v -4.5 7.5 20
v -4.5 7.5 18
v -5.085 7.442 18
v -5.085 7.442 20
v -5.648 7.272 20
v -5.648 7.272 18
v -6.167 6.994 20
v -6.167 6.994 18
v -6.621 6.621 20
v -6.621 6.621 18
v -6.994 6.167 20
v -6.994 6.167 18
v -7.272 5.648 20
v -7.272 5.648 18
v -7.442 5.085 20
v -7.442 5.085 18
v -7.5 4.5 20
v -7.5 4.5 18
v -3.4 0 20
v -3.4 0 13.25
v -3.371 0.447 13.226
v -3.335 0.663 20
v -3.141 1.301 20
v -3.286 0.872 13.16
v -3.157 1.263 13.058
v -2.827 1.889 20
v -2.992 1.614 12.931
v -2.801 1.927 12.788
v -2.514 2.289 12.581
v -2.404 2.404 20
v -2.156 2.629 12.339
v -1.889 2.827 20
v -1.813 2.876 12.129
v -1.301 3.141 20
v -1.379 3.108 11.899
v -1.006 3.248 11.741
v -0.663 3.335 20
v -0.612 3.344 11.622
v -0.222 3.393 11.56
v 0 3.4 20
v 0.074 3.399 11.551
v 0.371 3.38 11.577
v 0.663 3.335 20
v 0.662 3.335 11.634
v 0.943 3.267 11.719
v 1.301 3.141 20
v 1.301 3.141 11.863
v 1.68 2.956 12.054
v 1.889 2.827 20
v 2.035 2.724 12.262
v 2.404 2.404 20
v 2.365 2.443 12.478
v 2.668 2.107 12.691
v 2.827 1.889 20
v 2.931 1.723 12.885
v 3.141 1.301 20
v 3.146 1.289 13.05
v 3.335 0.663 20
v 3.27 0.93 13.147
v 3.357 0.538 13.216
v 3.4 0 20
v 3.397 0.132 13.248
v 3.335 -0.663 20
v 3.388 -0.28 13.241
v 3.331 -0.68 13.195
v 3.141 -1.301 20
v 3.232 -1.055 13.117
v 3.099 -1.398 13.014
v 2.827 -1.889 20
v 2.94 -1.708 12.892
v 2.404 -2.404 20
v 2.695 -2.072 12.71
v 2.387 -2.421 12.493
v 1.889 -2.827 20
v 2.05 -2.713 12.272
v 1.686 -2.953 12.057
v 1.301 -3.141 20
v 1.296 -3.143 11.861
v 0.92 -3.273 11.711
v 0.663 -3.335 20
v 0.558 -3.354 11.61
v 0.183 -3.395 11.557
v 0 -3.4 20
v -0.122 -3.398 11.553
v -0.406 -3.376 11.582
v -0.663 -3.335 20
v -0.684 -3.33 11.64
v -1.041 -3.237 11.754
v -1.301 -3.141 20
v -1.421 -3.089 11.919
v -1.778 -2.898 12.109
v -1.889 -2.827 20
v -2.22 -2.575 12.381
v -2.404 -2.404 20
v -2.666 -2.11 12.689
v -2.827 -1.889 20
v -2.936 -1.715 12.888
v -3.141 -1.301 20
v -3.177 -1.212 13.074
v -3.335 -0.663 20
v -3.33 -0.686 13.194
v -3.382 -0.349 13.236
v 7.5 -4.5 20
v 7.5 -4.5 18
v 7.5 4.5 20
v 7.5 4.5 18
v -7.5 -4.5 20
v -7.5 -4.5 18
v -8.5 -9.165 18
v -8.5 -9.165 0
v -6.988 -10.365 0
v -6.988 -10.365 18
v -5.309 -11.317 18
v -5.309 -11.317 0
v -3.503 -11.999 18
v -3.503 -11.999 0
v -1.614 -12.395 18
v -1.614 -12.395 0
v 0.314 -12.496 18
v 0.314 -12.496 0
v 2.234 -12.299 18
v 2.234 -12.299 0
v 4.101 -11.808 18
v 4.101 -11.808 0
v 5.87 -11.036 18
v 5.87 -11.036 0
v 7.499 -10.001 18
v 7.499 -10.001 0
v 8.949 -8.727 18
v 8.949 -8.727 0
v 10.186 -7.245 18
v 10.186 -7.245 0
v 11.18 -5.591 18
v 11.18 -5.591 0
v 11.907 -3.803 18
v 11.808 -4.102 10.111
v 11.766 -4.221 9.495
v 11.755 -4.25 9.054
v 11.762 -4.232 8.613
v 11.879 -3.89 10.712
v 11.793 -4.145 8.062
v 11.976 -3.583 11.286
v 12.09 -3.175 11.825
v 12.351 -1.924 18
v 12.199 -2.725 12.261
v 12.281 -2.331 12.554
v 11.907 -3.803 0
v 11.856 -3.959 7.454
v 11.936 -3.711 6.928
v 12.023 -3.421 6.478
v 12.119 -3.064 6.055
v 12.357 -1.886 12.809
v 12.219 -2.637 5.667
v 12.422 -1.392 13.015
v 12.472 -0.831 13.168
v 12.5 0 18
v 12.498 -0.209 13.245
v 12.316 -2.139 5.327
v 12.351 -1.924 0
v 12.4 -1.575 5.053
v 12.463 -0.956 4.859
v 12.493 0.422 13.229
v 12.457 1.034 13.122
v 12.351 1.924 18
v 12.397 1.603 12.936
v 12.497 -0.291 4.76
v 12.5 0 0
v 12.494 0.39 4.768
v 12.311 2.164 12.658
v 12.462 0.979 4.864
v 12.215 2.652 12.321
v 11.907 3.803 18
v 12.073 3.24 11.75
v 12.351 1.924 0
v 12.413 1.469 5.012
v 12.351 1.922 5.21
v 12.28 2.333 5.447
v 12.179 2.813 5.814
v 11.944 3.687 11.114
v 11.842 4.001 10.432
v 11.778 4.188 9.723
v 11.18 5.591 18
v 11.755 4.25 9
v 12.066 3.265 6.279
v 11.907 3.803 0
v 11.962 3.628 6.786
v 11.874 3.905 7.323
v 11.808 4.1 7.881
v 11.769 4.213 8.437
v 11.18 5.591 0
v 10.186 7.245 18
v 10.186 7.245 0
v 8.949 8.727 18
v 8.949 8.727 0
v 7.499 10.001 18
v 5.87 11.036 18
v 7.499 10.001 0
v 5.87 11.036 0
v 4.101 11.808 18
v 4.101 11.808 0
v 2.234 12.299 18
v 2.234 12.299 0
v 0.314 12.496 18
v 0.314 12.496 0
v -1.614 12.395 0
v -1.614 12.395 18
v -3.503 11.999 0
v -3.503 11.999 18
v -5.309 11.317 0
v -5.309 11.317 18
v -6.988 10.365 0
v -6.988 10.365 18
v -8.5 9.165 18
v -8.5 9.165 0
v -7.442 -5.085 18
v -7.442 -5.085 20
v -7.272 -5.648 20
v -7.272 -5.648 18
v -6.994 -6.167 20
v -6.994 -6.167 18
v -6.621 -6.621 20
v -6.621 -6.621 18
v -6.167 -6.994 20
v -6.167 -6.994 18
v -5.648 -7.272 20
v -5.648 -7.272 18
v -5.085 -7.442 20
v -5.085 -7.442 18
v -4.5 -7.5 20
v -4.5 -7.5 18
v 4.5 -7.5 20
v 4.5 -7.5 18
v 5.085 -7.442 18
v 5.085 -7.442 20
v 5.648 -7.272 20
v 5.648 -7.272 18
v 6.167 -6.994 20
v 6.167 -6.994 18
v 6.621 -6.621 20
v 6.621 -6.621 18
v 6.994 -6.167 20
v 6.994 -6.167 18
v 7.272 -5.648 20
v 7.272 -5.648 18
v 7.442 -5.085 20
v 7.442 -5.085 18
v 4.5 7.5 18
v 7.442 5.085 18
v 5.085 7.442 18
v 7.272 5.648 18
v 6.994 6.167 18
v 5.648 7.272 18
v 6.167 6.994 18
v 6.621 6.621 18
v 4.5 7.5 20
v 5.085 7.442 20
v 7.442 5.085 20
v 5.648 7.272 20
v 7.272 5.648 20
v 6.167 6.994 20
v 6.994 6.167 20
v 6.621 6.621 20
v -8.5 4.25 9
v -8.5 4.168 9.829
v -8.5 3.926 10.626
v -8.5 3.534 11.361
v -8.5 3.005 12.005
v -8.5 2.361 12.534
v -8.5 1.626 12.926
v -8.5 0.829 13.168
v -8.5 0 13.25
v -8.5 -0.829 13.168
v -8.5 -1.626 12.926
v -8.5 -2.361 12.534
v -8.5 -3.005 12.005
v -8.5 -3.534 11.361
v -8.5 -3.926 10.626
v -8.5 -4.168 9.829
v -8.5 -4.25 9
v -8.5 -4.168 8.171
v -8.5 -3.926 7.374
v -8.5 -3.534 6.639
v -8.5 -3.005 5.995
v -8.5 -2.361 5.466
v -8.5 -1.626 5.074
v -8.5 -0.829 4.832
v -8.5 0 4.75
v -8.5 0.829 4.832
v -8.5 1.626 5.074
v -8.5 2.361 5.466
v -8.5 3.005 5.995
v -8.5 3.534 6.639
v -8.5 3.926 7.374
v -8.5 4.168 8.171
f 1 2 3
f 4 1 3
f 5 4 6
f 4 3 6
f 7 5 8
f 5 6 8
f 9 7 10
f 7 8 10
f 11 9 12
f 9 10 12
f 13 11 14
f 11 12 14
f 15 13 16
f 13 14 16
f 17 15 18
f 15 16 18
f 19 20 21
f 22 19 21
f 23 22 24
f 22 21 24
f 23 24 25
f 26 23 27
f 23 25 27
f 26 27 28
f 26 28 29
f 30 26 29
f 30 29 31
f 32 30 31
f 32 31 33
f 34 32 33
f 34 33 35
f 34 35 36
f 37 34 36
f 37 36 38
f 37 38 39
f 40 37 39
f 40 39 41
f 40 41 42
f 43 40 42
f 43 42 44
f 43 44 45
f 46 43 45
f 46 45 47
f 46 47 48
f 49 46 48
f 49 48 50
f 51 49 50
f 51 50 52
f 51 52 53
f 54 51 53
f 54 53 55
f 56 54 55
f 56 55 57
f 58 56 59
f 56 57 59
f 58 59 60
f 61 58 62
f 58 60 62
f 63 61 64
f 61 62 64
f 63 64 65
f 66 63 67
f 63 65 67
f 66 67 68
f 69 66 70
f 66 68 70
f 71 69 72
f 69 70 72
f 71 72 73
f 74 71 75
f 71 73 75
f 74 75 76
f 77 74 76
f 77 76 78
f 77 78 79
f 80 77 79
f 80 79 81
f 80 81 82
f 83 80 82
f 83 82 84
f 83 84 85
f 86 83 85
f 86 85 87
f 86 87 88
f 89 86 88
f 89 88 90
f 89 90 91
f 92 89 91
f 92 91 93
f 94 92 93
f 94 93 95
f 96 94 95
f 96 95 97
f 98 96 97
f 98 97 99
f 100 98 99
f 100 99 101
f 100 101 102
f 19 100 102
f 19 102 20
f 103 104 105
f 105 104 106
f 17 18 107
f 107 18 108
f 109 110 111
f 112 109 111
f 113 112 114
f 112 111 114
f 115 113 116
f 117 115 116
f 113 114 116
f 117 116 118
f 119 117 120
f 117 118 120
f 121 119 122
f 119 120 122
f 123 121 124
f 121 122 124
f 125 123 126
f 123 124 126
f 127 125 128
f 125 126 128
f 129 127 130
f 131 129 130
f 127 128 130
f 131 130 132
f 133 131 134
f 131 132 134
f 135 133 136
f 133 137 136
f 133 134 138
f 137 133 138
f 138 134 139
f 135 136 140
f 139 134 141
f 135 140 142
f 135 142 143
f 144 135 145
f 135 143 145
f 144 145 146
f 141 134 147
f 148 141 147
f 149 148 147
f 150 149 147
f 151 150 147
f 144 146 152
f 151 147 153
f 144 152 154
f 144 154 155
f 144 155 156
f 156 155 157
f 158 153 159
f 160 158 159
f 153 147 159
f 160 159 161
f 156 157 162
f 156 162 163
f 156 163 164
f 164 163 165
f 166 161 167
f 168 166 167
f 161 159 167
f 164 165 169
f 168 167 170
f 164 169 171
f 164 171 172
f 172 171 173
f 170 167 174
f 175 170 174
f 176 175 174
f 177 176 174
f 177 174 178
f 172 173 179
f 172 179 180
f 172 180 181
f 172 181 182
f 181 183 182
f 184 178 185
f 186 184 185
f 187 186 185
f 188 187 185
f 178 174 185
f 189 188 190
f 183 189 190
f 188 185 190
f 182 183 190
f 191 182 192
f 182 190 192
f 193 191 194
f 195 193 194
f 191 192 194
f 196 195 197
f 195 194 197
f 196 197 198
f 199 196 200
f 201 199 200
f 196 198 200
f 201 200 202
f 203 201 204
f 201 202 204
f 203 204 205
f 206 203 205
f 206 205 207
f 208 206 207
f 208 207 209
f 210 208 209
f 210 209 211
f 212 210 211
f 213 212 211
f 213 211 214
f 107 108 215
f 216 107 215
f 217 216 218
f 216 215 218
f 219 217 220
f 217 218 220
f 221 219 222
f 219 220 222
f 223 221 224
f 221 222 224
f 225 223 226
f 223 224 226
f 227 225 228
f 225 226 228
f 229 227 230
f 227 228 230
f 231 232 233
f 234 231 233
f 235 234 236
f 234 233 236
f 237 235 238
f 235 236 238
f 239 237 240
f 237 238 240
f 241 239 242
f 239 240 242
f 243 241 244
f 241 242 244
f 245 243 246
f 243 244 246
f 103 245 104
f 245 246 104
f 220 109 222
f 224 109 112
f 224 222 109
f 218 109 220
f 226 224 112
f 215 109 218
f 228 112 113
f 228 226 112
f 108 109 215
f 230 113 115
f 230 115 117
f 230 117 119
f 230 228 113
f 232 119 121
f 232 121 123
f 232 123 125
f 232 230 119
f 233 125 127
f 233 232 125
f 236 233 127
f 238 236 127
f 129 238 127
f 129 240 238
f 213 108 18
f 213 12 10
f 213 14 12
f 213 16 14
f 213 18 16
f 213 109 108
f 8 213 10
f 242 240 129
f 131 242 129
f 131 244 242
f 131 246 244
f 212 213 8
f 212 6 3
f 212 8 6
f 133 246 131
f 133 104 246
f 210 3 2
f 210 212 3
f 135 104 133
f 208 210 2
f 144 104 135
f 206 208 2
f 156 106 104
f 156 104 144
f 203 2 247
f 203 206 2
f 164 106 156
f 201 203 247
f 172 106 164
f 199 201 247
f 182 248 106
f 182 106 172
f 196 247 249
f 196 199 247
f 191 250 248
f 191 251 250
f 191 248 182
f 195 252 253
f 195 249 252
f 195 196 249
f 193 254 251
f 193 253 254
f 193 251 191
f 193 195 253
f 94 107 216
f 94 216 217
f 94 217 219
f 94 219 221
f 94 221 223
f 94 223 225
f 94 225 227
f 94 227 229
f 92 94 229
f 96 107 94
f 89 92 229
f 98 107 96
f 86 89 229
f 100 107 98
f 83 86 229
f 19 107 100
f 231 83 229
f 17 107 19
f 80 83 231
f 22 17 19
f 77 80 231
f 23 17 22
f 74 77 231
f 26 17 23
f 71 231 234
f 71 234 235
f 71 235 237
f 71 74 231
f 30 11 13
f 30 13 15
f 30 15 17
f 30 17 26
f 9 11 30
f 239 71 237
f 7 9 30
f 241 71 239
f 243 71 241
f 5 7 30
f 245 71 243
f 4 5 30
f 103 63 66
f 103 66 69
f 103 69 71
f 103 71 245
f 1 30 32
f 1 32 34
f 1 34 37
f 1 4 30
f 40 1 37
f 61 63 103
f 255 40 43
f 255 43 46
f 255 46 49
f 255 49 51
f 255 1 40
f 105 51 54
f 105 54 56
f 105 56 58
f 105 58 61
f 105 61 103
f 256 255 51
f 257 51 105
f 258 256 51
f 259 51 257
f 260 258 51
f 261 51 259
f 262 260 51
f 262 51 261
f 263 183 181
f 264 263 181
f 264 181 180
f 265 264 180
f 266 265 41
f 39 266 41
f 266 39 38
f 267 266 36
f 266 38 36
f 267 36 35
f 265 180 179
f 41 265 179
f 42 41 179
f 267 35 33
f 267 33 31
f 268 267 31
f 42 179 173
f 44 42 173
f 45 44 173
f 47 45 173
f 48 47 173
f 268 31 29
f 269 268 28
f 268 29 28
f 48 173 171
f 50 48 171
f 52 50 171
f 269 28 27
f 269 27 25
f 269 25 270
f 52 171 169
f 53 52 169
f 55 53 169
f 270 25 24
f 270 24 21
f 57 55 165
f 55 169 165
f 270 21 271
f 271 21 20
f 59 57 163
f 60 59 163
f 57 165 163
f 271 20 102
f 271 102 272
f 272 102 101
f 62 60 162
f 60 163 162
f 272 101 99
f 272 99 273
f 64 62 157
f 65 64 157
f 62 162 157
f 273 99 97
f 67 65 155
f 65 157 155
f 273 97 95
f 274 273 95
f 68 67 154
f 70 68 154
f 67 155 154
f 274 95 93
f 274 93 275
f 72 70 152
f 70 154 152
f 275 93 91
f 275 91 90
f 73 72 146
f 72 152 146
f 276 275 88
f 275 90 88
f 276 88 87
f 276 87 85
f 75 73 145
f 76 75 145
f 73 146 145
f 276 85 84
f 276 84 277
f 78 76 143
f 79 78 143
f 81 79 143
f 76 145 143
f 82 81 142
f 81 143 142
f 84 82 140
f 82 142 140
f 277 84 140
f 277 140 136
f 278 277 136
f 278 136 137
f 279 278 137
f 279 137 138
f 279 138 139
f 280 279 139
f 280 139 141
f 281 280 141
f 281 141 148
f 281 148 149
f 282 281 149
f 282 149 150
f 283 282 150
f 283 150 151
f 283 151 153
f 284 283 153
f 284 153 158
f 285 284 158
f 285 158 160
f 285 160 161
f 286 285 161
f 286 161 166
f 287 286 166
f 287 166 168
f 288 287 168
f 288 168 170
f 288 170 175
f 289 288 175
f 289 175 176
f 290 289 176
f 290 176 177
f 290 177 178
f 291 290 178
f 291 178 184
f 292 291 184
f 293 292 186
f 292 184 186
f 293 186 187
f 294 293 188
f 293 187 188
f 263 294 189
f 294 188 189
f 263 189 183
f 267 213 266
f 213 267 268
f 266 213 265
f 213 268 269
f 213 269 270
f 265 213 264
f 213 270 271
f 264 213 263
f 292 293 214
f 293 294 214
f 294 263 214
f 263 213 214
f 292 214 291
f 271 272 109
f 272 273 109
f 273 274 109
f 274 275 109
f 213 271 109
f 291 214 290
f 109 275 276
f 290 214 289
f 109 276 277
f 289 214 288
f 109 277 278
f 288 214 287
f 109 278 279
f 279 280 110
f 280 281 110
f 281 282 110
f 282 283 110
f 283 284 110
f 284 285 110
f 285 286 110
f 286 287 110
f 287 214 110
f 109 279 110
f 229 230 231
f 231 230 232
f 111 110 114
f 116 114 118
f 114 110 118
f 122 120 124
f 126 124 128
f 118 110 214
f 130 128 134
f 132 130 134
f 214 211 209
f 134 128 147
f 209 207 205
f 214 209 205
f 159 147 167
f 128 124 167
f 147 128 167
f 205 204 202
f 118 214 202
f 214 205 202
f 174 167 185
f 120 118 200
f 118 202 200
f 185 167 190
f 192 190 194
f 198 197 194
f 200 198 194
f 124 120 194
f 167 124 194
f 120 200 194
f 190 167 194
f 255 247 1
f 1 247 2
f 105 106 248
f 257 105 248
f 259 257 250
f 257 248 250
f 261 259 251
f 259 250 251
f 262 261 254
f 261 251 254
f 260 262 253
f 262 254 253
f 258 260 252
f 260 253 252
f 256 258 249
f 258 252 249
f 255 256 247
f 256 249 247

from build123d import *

# Parameters (mm, degrees)
F1_DEPTH = 18
F3_DEPTH = 2
F6_D     = 8.5
F7_D     = 6.8
F7_DEPTH = 10
F7_TIP   = 2.0429261047


with BuildPart() as f1:
    # F0 (on Top) → F1 (new body)
    with BuildSketch(Plane.XY):
        with BuildLine():
            Line((-8.5, 9.1651513899), (-8.5, -9.1651513899))
            ThreePointArc((-8.5, -9.1651513899), (12.5, 0), (-8.5, 9.1651513899))
        make_face()
    extrude(amount=F1_DEPTH)

    # F2 (on face) → F3 (join)
    with BuildSketch(Plane.XY.offset(18)):
        with BuildLine():
            Line((-4.5, -7.5), (4.5, -7.5))
            ThreePointArc((4.5, -7.5), (6.6213203436, -6.6213203436), (7.5, -4.5))
            Line((7.5, -4.5), (7.5, 4.5))
            ThreePointArc((7.5, 4.5), (6.6213203436, 6.6213203436), (4.5, 7.5))
            Line((4.5, 7.5), (-4.5, 7.5))
            ThreePointArc((-4.5, 7.5), (-6.6213203436, 6.6213203436), (-7.5, 4.5))
            Line((-7.5, 4.5), (-7.5, -4.5))
            ThreePointArc((-7.5, -4.5), (-6.6213203436, -6.6213203436), (-4.5, -7.5))
        make_face()
    extrude(amount=F3_DEPTH)

    # F6 (through all)
    with Locations(Plane(origin=(-8.5, 0, 0), x_dir=(0, -1, 0), z_dir=(-1, 0, 0))):
        with Locations((0, 9)):
            Hole(F6_D / 2)

    # F7
    with Locations(Plane.XY.offset(20)):
        with Locations((0, 0)):
            Hole(F7_D / 2, depth=F7_DEPTH)
            with Locations((0, 0, -(F7_DEPTH + F7_TIP / 2))):  # 118° drill point
                Cone(0, F7_D / 2, F7_TIP, mode=Mode.SUBTRACT)


solid = f1.part
